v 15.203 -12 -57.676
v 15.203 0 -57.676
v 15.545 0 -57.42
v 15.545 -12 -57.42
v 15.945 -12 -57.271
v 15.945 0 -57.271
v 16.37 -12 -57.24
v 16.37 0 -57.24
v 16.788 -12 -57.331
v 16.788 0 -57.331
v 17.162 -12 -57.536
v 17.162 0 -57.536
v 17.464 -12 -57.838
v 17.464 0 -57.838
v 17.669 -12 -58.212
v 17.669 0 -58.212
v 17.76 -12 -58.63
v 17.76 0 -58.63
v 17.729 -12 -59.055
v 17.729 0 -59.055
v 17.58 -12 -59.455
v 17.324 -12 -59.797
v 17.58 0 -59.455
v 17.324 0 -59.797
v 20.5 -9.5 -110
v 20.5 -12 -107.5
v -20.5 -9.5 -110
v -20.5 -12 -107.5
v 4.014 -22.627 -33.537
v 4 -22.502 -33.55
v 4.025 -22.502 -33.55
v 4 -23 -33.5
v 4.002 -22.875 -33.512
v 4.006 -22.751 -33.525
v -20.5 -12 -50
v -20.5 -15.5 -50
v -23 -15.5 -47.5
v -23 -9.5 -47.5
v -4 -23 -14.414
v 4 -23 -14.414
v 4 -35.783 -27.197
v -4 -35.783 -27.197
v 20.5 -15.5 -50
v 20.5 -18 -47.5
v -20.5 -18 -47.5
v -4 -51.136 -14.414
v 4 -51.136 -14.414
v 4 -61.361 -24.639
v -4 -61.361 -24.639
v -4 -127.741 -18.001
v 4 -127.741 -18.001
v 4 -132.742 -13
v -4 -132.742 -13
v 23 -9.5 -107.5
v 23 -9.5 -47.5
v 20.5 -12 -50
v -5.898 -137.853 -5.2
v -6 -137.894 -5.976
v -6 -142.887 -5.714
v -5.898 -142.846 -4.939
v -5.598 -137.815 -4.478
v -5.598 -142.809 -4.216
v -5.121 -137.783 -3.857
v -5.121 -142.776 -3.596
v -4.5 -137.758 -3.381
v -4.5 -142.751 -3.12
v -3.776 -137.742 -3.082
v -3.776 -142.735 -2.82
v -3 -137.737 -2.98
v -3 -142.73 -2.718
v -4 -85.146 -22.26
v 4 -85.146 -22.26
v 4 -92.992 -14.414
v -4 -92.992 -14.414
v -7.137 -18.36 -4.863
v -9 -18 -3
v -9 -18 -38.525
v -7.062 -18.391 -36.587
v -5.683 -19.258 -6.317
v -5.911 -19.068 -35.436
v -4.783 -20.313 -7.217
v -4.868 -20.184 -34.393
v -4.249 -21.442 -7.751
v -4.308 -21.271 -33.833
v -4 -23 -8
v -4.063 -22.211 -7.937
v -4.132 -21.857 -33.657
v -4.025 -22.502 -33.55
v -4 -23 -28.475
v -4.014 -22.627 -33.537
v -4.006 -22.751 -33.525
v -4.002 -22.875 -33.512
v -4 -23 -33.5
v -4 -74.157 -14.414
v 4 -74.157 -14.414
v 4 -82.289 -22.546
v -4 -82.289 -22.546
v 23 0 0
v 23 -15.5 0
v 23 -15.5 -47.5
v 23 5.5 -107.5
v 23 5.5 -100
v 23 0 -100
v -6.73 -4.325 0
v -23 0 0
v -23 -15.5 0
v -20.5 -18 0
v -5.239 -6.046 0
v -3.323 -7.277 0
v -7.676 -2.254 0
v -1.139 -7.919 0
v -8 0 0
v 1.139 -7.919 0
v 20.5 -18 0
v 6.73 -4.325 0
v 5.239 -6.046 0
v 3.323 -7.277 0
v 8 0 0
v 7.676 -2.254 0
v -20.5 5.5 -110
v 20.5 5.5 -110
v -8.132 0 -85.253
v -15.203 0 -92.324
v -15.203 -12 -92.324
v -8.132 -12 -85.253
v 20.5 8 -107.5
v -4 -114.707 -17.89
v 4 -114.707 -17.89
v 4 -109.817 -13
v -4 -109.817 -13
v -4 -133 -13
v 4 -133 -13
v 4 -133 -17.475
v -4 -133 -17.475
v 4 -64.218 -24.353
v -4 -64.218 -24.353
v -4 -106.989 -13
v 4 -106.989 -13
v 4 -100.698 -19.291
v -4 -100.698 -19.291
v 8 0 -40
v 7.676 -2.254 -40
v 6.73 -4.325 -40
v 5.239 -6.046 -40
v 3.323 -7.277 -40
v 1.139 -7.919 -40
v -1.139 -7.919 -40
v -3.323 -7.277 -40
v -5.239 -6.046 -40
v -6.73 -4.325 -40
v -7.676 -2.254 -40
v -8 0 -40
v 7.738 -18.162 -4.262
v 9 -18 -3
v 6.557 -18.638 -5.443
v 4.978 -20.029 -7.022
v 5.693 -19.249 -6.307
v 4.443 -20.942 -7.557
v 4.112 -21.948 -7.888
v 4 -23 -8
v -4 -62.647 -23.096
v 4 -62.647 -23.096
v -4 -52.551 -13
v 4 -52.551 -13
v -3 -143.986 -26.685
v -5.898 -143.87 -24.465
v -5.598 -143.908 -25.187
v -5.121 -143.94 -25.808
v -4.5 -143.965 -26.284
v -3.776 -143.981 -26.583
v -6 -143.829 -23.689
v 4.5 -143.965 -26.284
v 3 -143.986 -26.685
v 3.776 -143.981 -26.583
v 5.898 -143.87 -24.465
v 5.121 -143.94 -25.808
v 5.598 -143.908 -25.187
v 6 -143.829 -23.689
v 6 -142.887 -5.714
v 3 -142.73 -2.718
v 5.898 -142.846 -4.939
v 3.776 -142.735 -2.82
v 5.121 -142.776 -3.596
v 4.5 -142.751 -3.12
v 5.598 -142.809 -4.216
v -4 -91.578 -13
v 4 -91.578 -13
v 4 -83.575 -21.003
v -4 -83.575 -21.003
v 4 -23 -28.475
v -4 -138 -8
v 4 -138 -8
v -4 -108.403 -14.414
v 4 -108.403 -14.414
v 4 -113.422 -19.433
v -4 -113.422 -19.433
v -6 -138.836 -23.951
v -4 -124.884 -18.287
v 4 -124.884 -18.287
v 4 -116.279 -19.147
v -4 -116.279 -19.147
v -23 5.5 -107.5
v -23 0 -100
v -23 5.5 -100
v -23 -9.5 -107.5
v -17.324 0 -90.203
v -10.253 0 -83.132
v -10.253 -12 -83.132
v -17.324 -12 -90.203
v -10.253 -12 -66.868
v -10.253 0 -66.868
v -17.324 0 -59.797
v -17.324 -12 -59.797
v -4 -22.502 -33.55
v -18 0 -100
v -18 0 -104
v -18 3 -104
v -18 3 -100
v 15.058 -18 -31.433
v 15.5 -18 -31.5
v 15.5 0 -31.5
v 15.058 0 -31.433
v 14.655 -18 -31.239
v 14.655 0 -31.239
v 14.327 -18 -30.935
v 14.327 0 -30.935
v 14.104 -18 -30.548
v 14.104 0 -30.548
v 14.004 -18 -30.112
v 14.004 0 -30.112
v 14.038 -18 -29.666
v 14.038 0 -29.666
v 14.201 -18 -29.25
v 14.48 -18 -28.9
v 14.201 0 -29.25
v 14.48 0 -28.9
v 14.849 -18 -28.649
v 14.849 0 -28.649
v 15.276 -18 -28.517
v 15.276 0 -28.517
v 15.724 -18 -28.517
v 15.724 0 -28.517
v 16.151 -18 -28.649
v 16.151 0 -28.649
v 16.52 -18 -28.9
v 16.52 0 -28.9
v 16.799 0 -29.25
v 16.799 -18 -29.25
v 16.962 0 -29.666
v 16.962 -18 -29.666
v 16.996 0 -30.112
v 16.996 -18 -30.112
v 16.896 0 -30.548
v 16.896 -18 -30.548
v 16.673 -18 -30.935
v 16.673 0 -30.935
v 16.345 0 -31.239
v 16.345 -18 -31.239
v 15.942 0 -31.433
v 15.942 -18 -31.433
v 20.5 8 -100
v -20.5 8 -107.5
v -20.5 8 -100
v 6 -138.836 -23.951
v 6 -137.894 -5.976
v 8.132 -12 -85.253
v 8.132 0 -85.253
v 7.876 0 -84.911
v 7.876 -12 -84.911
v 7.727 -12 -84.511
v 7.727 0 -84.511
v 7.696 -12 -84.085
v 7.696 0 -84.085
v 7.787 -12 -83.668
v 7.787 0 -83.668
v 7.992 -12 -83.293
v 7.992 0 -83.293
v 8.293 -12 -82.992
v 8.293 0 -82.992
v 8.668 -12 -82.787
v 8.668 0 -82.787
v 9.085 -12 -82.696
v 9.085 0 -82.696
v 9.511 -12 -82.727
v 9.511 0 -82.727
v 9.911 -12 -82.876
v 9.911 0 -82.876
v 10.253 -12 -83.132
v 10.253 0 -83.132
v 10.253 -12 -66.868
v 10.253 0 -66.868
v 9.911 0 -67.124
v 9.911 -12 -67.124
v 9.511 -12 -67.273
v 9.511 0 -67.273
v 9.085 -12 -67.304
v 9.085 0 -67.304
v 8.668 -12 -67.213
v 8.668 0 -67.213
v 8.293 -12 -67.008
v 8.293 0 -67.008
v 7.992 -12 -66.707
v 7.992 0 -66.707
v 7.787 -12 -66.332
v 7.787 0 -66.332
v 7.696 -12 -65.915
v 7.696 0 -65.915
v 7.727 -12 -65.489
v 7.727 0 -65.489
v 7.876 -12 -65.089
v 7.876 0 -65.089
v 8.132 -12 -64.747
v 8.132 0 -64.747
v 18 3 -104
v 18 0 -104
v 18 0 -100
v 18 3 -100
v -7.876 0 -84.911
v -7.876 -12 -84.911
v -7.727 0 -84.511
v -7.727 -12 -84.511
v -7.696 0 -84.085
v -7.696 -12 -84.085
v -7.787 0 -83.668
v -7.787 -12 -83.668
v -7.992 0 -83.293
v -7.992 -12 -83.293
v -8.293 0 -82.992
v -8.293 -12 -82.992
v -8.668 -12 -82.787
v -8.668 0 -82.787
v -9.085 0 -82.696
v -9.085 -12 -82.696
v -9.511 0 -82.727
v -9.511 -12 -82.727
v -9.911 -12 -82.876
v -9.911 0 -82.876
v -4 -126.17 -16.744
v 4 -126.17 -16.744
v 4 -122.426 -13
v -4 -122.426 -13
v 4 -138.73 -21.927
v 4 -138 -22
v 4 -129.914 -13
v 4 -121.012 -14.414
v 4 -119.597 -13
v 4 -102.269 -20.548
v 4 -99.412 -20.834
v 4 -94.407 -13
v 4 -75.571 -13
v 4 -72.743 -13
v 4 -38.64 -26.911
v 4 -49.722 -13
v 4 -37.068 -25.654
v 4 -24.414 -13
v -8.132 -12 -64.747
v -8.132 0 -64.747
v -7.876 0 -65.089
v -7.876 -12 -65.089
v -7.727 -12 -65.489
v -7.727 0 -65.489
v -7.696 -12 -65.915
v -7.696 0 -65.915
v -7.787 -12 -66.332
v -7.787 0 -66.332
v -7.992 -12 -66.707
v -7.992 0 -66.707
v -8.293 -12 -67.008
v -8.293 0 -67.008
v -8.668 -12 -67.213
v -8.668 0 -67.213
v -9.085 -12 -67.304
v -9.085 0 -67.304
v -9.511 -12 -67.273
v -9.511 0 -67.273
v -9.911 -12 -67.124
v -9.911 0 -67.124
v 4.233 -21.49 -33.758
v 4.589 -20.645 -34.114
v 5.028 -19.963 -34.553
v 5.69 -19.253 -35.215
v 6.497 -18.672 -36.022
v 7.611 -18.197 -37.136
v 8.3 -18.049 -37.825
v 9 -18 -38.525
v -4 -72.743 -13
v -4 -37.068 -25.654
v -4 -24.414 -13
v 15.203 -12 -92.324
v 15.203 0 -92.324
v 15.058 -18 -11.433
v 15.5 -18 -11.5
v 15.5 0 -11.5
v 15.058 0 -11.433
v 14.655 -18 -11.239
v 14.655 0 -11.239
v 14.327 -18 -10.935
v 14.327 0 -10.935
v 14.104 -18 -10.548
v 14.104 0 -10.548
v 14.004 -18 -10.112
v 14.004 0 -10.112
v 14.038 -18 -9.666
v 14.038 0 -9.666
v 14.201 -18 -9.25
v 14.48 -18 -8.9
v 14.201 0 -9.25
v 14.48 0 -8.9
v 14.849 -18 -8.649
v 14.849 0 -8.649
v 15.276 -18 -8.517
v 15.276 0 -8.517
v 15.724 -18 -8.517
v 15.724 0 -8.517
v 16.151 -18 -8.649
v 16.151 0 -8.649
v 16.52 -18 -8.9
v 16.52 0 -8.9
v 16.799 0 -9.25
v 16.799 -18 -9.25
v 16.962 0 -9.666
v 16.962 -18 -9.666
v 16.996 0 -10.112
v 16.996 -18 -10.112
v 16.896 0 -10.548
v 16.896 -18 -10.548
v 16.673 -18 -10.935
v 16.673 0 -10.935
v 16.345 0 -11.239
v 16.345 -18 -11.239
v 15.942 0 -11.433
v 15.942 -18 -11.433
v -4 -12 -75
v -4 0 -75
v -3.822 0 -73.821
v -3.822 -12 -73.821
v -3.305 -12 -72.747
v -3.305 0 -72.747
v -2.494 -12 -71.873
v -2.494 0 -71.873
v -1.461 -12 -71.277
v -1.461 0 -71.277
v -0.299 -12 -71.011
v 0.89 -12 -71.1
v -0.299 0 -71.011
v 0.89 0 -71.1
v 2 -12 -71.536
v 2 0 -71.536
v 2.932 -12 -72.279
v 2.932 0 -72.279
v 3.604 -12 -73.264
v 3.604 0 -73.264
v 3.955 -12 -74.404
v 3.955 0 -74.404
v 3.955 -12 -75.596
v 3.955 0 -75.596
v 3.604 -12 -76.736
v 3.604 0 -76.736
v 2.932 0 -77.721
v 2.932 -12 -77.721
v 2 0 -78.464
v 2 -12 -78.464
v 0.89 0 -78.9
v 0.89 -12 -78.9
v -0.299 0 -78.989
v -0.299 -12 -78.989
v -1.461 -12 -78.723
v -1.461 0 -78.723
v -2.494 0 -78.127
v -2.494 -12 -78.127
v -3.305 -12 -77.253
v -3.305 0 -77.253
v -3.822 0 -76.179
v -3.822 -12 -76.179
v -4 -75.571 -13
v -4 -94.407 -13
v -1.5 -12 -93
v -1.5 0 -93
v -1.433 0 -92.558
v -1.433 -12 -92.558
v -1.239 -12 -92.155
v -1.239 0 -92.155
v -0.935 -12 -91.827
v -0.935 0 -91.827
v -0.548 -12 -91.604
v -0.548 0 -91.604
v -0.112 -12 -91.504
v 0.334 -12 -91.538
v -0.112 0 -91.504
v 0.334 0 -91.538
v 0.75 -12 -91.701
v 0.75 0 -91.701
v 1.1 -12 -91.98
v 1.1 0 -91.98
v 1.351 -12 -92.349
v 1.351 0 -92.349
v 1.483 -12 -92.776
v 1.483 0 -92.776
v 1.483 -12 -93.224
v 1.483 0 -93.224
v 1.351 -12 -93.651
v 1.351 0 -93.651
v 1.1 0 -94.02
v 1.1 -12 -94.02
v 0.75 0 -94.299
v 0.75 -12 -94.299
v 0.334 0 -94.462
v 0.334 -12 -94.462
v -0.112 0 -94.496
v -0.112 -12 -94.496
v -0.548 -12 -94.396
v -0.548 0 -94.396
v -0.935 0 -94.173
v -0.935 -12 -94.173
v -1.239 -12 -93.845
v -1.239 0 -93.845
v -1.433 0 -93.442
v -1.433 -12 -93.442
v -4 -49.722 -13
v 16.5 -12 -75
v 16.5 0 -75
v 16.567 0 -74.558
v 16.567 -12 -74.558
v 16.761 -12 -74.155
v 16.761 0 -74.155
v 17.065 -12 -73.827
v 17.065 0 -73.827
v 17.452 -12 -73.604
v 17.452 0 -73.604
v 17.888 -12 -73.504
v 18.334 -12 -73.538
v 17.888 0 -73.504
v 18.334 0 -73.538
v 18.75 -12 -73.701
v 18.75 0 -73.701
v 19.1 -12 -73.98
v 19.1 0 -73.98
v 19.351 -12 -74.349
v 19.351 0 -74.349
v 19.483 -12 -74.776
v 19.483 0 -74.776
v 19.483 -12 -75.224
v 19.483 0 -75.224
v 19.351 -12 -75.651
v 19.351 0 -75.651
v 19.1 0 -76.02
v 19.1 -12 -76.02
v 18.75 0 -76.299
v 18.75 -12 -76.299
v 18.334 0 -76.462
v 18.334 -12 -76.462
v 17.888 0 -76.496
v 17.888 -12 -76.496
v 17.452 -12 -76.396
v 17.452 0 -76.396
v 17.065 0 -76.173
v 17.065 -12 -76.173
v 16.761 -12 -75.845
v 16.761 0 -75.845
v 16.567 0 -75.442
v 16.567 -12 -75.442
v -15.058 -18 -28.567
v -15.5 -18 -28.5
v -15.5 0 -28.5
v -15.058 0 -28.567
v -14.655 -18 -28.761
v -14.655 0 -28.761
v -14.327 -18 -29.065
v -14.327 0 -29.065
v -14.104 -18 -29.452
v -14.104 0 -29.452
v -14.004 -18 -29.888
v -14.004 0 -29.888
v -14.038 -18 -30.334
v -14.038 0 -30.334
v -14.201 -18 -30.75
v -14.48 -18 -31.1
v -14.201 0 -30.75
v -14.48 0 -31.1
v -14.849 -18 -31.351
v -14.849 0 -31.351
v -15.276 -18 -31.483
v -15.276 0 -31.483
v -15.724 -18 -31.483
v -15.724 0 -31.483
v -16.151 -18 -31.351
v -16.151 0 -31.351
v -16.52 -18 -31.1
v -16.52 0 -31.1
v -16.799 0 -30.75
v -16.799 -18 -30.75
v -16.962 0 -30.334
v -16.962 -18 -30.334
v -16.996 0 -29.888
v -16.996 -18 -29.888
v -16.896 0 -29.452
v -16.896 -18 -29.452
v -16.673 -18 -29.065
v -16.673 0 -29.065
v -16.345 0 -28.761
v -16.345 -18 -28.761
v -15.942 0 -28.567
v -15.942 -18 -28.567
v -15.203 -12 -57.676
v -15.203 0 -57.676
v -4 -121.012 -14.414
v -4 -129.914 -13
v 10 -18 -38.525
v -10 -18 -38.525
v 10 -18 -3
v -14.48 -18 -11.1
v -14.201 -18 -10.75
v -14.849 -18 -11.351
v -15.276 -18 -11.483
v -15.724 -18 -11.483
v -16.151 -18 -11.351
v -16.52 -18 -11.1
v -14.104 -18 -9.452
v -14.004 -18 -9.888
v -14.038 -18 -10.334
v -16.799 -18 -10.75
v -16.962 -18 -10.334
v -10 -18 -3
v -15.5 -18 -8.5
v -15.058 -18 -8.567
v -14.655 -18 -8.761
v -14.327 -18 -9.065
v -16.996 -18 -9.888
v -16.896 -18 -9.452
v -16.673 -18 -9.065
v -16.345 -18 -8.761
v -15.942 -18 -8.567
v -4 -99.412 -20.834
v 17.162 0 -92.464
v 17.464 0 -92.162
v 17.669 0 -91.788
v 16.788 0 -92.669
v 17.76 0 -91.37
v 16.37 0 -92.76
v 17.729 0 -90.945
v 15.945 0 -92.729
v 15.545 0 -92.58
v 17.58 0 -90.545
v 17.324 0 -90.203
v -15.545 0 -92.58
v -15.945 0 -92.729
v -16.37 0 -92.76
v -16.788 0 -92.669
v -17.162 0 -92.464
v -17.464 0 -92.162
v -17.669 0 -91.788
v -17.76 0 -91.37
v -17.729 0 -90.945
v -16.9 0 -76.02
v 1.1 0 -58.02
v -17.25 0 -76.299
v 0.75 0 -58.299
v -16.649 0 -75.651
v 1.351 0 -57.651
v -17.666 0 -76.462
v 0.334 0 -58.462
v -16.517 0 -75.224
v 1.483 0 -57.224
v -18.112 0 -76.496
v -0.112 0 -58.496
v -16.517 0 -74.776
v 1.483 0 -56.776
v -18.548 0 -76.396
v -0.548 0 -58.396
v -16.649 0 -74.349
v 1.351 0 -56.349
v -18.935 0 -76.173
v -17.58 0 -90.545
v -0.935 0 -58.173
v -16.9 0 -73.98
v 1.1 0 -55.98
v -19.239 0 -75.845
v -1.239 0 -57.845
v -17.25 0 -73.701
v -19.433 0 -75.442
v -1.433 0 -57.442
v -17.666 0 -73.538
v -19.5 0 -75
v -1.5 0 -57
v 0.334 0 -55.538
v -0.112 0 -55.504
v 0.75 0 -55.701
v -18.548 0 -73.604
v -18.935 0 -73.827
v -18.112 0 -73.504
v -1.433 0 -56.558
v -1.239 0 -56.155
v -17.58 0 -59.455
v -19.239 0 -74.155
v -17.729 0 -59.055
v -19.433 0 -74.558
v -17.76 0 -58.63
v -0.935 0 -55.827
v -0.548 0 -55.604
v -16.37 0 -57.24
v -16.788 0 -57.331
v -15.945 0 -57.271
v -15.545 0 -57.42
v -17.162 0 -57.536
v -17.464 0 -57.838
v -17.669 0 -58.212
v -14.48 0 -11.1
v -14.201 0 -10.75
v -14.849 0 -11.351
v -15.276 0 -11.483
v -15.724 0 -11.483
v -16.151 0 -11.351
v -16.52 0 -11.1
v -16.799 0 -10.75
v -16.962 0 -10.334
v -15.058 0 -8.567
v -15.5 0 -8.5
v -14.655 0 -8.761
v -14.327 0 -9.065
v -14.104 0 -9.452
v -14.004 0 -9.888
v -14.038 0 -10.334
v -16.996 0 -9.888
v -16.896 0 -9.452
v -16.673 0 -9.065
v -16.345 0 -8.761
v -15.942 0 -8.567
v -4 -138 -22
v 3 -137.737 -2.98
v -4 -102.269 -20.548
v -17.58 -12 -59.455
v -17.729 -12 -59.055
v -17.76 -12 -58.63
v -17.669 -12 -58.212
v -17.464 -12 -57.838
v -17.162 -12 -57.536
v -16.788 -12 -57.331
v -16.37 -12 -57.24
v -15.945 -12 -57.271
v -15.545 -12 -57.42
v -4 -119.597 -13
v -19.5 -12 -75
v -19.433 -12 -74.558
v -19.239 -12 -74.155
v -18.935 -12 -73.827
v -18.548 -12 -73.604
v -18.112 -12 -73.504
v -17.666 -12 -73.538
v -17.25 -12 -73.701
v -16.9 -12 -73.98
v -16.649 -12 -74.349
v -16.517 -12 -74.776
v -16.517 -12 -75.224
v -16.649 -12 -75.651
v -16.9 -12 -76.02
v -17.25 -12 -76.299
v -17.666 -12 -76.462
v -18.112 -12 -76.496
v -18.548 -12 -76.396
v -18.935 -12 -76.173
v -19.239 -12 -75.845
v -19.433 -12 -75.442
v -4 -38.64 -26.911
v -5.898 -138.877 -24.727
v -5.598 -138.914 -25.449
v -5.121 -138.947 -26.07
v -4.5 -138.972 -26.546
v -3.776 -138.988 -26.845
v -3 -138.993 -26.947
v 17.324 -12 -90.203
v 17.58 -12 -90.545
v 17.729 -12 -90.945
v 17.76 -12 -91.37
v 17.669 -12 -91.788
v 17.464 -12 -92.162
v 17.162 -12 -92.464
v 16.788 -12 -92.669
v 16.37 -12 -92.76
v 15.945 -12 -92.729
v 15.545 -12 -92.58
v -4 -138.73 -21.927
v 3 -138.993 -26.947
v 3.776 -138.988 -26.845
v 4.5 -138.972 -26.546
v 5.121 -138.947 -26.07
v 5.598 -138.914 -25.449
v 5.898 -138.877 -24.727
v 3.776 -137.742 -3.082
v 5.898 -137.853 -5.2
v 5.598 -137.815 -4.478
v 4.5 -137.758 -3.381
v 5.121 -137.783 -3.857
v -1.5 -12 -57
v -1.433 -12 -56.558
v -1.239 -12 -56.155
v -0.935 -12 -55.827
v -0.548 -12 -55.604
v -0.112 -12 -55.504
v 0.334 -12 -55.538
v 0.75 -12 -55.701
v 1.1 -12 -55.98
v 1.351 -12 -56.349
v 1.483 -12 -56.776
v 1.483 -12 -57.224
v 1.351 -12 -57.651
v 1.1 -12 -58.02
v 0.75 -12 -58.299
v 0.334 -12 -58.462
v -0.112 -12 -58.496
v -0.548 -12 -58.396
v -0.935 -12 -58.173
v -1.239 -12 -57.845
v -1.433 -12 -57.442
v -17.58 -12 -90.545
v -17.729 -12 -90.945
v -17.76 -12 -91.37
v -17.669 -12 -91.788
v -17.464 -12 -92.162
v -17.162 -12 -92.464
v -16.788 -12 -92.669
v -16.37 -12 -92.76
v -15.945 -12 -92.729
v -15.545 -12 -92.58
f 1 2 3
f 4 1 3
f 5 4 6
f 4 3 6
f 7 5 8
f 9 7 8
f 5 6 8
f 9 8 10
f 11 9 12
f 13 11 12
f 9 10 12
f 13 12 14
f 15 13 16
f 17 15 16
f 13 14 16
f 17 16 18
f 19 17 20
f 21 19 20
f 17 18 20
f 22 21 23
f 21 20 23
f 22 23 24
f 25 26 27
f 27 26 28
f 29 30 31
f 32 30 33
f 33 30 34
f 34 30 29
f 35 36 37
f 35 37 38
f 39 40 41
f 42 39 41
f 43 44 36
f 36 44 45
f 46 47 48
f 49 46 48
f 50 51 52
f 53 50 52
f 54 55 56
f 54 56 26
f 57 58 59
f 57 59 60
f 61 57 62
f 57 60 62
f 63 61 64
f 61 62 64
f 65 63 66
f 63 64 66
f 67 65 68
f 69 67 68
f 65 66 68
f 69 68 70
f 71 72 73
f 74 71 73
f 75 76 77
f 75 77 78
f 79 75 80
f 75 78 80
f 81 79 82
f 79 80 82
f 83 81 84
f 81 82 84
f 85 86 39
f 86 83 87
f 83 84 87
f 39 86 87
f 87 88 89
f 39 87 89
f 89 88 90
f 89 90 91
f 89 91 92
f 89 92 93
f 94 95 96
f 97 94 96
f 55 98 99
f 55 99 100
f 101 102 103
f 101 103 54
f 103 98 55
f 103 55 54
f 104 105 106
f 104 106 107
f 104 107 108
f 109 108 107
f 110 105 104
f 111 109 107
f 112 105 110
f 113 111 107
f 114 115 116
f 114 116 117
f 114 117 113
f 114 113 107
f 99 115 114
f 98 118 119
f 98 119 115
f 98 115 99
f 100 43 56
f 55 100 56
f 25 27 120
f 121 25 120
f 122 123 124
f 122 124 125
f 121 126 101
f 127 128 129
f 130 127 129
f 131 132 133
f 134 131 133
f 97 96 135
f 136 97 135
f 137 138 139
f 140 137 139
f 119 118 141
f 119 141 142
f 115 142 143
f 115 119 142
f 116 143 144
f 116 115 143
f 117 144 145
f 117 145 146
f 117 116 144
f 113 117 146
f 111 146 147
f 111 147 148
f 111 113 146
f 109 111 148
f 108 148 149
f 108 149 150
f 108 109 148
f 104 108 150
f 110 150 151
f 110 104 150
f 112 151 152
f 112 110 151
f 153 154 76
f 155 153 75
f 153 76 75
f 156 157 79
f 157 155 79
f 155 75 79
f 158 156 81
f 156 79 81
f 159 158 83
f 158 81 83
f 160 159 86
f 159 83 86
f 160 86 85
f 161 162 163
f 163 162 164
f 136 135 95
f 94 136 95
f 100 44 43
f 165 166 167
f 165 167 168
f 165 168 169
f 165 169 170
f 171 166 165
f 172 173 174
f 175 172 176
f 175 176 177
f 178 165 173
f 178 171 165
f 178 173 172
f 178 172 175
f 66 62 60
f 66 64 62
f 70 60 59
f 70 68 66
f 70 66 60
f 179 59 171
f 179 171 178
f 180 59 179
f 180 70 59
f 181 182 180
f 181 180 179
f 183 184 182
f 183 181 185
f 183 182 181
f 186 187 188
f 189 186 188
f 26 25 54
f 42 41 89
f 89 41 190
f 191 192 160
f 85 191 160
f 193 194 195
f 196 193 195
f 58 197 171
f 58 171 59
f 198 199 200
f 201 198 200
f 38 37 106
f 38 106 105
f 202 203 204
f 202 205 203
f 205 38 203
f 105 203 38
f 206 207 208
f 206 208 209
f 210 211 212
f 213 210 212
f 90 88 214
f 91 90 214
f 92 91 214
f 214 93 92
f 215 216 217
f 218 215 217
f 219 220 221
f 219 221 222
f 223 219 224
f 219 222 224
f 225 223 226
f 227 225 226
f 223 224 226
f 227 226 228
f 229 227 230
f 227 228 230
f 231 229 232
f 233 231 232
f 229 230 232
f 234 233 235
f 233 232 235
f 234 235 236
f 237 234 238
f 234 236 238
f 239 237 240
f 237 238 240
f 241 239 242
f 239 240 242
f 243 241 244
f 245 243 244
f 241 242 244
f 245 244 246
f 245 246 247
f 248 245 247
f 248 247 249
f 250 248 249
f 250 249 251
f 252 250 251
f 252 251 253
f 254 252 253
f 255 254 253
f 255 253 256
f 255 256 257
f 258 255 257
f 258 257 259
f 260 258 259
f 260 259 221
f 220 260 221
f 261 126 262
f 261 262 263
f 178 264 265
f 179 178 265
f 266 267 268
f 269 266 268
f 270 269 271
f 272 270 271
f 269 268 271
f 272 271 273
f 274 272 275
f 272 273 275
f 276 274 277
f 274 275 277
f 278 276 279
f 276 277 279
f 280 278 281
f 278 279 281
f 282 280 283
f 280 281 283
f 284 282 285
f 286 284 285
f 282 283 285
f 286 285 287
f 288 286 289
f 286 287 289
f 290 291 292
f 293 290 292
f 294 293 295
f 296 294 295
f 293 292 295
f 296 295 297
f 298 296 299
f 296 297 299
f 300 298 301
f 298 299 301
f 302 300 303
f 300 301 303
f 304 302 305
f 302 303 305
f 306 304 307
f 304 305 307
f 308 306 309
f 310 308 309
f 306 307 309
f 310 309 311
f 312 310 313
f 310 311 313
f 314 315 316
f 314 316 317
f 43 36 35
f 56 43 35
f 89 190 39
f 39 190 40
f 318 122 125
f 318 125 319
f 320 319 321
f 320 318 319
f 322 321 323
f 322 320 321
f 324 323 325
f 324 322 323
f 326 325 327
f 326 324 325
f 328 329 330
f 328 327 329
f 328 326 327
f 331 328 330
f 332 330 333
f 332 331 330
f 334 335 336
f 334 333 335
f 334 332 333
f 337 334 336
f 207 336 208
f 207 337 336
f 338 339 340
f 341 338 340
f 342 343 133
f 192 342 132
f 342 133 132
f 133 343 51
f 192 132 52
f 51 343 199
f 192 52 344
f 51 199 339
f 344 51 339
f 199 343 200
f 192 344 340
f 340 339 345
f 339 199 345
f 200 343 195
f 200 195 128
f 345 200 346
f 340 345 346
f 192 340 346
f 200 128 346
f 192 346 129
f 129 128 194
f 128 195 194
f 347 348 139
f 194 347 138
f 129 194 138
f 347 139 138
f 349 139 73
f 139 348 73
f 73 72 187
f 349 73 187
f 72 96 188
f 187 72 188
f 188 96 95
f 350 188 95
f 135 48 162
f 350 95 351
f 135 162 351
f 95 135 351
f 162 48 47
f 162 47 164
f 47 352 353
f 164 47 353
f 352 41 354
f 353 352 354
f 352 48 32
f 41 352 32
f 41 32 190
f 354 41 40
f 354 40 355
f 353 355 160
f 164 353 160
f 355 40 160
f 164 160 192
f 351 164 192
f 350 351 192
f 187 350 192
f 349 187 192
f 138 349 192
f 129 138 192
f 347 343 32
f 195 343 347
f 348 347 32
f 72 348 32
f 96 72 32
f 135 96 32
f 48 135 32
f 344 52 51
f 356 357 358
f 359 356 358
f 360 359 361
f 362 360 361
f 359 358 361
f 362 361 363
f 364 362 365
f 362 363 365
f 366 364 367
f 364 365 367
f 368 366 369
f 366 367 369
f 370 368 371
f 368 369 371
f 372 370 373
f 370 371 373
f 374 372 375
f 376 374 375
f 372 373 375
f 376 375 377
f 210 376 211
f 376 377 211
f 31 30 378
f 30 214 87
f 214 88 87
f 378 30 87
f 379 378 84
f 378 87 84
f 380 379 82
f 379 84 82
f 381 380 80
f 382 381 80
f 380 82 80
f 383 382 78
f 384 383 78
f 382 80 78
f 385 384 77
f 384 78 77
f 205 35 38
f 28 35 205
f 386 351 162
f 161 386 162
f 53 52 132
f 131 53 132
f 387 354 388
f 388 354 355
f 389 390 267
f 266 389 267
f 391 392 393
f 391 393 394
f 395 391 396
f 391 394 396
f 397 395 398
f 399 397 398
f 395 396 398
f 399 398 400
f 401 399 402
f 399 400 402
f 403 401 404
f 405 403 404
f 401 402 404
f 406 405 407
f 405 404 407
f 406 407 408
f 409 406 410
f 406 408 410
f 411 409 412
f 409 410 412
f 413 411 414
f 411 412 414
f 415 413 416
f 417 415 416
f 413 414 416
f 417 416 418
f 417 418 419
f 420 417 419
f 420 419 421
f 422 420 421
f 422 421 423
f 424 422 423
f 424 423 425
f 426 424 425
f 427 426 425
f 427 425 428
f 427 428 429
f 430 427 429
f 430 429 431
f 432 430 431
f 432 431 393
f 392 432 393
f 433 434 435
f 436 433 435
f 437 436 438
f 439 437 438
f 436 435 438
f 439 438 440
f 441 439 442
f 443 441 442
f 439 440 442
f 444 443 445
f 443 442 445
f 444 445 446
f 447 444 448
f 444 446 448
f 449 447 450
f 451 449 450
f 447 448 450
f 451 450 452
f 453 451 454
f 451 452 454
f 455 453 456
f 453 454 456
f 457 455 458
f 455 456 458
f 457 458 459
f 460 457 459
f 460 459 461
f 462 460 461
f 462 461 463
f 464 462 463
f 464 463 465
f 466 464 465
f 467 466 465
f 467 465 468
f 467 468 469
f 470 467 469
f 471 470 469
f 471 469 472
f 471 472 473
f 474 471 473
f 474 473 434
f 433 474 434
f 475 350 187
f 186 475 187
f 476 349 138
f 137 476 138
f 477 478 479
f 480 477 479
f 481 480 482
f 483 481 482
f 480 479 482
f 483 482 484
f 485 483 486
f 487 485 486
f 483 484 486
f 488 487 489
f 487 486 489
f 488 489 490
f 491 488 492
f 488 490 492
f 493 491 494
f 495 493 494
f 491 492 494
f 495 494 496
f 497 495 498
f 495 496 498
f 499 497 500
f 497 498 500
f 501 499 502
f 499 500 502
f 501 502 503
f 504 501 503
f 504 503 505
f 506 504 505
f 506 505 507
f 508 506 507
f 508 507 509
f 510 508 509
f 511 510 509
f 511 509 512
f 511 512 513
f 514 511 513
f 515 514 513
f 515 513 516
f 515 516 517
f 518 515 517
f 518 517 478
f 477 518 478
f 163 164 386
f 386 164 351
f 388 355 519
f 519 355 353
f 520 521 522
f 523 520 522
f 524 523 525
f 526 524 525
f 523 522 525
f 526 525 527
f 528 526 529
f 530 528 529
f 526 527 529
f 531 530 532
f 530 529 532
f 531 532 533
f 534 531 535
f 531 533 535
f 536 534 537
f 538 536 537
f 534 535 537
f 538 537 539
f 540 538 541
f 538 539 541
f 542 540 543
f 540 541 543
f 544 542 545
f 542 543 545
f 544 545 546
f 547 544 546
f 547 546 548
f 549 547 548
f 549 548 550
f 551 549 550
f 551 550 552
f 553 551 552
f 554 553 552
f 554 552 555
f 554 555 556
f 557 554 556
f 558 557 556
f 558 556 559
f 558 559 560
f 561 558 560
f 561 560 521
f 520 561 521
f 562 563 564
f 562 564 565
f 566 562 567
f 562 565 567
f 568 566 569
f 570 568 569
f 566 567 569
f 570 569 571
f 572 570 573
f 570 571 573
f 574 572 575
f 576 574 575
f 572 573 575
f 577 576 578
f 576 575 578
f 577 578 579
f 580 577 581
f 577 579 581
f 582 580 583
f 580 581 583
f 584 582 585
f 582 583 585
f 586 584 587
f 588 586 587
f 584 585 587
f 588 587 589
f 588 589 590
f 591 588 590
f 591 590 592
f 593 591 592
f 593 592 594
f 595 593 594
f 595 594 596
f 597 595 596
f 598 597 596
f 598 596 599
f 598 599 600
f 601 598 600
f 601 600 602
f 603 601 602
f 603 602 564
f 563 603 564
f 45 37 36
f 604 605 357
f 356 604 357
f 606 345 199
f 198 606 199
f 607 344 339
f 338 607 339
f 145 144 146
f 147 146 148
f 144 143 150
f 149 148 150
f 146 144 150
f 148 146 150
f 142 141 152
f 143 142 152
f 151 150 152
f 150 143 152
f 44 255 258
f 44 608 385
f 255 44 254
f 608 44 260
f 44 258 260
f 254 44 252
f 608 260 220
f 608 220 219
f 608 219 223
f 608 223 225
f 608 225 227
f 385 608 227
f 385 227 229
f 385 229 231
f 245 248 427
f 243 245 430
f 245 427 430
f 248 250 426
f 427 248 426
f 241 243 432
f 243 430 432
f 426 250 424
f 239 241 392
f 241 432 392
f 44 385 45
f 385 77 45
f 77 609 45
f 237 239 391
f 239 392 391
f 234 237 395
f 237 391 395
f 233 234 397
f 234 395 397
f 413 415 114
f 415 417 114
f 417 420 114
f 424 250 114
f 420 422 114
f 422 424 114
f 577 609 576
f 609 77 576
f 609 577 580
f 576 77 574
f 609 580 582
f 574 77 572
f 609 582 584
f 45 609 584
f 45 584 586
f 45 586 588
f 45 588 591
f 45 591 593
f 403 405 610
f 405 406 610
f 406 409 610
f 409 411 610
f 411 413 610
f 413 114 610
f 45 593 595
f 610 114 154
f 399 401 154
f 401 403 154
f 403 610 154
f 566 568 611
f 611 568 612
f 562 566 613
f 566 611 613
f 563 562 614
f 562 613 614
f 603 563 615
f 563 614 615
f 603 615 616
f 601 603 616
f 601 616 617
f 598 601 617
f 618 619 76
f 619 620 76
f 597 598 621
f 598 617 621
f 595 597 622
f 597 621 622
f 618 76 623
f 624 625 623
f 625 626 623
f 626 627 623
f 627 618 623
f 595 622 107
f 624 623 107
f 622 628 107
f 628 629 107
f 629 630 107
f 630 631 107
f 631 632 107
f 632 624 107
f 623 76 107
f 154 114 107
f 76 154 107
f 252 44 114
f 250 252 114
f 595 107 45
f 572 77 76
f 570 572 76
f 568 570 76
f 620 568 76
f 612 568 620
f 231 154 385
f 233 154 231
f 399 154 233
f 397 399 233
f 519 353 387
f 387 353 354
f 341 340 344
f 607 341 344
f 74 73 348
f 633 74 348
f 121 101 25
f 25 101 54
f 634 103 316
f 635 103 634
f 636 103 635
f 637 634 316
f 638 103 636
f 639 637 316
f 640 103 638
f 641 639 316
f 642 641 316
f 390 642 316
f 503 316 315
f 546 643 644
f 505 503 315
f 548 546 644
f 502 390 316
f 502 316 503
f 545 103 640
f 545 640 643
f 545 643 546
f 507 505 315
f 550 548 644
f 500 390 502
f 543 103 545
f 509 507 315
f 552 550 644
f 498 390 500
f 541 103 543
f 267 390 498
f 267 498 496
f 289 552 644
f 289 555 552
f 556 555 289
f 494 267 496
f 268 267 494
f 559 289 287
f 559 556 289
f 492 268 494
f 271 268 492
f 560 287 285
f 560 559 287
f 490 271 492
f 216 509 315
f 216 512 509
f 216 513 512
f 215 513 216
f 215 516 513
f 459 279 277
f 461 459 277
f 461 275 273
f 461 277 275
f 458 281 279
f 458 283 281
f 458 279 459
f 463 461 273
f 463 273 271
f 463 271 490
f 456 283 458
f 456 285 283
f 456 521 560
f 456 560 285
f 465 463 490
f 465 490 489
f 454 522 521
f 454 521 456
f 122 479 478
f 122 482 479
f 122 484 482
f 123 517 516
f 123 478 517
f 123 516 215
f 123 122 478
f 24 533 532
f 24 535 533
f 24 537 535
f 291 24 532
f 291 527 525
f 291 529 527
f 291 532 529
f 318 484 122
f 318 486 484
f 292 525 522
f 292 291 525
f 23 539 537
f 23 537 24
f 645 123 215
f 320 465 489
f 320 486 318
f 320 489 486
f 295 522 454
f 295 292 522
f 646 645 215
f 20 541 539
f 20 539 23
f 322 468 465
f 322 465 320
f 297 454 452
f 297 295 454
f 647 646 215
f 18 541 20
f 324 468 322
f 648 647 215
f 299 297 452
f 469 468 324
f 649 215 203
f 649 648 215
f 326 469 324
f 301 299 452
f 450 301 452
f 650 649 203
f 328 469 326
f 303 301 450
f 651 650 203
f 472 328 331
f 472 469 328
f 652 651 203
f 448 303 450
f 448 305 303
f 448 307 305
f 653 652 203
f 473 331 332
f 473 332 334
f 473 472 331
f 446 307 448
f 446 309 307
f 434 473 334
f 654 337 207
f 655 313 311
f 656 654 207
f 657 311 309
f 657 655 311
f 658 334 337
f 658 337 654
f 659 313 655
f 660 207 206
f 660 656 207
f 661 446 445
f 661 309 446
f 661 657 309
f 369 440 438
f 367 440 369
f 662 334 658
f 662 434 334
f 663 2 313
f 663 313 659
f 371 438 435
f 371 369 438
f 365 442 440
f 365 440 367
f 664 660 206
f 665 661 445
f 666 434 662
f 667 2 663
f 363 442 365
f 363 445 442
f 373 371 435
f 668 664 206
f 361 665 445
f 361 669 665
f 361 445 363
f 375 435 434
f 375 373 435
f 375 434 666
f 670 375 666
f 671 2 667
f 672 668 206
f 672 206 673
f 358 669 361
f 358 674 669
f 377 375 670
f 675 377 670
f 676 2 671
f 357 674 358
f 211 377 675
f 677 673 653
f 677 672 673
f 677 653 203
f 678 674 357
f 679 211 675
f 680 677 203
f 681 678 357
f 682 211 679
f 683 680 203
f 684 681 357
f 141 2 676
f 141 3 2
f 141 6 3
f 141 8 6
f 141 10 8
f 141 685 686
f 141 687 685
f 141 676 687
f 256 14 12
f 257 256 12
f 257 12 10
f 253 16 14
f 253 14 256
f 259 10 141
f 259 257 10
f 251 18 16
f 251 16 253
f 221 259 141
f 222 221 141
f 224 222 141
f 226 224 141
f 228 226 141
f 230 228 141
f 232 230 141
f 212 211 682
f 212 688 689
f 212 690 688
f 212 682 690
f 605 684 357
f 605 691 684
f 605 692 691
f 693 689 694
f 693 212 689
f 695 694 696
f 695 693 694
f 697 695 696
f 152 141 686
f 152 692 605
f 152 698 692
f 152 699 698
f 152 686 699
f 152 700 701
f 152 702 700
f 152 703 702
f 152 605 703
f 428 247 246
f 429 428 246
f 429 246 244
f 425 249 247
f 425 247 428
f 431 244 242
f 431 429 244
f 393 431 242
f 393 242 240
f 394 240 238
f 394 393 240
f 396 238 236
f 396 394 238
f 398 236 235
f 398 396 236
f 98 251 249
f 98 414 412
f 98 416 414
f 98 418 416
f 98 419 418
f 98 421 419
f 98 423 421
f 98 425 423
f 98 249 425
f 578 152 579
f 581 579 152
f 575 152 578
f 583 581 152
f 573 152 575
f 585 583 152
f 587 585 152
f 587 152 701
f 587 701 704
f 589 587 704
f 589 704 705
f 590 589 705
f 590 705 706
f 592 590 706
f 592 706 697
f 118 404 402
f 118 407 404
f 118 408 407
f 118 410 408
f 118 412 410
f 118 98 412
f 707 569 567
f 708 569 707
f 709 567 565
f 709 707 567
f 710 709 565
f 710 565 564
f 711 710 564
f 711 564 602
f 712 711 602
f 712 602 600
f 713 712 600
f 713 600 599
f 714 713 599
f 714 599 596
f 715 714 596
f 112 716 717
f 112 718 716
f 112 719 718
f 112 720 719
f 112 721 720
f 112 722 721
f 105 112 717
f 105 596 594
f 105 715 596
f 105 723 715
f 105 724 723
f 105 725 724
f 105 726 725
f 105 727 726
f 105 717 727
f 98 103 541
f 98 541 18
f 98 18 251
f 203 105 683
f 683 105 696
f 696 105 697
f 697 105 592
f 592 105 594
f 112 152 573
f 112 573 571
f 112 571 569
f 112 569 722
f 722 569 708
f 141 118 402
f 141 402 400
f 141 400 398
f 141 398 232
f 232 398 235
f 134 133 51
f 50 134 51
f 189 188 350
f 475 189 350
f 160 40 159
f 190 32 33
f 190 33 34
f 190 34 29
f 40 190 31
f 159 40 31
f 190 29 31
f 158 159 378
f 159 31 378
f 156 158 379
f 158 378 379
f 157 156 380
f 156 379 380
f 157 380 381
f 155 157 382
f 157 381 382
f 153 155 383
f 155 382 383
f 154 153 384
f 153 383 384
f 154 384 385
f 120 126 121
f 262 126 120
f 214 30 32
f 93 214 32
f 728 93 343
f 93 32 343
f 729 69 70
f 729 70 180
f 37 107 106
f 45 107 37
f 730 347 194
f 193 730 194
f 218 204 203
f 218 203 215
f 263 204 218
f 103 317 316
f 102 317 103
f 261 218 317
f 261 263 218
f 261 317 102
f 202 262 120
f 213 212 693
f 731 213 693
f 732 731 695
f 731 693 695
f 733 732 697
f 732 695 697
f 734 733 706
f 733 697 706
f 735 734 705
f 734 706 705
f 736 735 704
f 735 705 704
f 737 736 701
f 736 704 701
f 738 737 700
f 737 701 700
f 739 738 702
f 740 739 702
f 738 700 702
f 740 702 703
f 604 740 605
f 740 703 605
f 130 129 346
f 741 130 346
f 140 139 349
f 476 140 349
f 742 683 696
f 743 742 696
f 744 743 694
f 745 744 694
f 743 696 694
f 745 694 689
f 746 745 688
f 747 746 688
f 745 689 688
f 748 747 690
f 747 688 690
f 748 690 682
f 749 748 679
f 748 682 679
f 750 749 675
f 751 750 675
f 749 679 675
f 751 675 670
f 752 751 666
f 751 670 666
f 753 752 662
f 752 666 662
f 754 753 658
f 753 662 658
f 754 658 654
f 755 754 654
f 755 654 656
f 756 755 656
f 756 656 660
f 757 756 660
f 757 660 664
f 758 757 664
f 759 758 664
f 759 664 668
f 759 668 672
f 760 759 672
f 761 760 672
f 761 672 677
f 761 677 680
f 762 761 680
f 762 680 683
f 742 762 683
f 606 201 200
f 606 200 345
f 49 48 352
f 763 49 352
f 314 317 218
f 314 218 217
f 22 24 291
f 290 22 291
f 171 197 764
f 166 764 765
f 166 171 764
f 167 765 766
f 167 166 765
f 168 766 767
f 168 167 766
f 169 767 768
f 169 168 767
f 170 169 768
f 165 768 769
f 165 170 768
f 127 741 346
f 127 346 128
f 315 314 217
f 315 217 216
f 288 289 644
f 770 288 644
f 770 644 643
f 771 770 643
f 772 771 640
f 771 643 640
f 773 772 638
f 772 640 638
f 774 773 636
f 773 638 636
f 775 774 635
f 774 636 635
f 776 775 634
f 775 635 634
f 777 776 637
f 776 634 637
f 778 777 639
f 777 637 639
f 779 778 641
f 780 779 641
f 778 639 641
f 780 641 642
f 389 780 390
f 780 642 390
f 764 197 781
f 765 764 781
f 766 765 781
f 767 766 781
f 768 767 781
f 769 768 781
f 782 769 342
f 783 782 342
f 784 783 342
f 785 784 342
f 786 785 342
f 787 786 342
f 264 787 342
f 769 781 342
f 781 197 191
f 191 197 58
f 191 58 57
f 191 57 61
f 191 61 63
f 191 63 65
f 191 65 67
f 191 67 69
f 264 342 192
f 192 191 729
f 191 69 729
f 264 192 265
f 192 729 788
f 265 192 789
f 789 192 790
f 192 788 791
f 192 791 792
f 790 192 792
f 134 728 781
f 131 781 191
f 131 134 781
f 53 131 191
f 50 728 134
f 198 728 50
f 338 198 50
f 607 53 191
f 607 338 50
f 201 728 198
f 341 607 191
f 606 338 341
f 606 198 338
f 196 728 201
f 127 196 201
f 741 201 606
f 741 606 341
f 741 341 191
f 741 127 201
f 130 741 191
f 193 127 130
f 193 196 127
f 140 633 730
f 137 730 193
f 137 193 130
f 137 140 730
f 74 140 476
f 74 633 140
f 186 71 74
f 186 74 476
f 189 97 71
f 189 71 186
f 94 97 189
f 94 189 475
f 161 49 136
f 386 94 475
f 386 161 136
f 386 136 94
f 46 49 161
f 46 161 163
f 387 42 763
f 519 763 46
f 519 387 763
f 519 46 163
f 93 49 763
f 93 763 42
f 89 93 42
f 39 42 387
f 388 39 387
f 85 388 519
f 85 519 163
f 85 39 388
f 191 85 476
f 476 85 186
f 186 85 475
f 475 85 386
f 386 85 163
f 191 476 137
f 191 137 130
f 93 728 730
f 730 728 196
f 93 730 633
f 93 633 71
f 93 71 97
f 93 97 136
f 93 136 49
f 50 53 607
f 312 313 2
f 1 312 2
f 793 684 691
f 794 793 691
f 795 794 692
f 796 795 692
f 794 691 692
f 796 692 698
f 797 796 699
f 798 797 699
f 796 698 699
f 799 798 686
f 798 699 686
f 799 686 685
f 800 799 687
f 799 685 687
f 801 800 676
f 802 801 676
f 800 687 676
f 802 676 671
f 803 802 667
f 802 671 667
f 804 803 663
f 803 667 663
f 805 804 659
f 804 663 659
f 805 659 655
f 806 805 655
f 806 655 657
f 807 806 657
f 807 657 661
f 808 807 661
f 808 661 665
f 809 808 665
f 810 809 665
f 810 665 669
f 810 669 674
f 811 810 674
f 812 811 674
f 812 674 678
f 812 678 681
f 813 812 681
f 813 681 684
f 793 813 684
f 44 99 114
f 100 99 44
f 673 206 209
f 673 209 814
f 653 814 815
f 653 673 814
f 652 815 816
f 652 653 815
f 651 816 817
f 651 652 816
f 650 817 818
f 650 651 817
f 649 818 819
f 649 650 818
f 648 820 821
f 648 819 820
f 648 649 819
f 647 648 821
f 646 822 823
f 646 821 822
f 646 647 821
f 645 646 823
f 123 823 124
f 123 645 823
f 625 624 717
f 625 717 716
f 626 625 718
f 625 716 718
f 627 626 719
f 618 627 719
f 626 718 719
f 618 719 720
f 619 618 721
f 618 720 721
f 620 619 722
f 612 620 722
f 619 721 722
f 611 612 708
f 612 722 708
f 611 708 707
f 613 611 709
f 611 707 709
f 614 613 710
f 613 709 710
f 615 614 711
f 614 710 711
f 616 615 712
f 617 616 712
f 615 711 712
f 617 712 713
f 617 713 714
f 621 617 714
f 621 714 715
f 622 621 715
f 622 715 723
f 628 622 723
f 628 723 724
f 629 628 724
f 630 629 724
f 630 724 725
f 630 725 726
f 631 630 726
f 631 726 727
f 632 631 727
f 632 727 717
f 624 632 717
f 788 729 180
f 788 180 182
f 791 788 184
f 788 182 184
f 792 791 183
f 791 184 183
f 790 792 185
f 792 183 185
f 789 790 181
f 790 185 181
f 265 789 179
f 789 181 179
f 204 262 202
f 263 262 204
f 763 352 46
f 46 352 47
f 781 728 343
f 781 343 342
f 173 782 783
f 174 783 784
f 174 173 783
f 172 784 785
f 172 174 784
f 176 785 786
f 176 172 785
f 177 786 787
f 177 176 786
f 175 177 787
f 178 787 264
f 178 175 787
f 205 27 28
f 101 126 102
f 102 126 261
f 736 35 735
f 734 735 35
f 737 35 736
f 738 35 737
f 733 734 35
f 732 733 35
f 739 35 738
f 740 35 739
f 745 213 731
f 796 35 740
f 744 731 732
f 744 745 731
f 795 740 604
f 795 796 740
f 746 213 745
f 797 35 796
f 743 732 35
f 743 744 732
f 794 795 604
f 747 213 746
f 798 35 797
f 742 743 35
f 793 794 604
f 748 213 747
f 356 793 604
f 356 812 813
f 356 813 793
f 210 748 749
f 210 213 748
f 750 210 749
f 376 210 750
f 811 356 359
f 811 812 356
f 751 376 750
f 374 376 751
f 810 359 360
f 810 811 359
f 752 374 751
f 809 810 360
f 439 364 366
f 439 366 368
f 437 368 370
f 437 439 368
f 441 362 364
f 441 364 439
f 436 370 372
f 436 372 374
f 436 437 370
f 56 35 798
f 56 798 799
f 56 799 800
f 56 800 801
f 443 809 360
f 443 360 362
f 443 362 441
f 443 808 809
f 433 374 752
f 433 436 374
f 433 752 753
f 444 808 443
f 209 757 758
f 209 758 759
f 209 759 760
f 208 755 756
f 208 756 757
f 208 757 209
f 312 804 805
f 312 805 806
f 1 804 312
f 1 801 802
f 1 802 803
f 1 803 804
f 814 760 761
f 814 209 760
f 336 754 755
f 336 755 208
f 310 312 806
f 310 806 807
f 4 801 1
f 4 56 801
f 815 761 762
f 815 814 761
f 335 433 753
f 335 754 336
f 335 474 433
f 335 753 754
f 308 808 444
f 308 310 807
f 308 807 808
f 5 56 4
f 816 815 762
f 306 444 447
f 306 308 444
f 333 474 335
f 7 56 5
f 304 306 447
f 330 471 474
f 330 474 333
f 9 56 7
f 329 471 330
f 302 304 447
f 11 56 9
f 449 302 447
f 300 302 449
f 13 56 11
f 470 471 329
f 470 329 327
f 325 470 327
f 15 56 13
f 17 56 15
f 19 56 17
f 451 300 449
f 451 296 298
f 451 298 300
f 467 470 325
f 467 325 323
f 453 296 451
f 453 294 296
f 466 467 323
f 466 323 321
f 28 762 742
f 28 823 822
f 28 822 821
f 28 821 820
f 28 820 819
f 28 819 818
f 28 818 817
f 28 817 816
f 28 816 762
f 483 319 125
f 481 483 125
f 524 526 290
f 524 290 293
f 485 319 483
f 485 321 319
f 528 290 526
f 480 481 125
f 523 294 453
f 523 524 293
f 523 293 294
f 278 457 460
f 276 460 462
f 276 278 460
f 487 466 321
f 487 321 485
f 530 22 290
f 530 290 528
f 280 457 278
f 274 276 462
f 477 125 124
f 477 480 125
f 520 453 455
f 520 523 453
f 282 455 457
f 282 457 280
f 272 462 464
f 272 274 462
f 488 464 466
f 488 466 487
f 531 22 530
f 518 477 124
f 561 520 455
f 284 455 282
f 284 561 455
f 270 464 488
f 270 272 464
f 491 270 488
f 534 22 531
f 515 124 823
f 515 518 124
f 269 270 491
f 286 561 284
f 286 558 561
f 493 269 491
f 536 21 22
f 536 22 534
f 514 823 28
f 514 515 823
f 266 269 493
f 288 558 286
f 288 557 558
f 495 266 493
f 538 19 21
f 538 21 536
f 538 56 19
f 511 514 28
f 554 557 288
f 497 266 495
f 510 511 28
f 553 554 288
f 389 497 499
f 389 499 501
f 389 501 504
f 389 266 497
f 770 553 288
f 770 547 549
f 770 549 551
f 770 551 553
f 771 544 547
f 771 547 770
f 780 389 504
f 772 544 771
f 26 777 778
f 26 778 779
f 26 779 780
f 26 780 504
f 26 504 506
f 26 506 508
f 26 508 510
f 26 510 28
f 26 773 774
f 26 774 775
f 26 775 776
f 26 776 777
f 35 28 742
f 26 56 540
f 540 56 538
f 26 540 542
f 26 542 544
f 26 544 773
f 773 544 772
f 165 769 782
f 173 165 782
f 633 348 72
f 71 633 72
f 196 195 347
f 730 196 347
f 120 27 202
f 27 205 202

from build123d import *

# Parameters (mm, degrees)
Y_KSEKLIK_EKSTR_ZYON1_DEPTH = 40
IZIM2_W                     = 46
IZIM2_H                     = 18
Y_KSEKLIK_EKSTR_ZYON2_DEPTH = 70
IZIM3_W                     = 60
IZIM3_H                     = 6
KES_EKSTR_ZYON1_DEPTH       = 60
IZIM4_R                     = 4
IZIM4_R_2                   = 1.5
KES_EKSTR_ZYON2_DEPTH       = 60
Y_KSEKLIK_EKSTR_ZYON3_DEPTH = 46
PAH4_SIZE                   = 2.5
IZIM7_W                     = 5
IZIM7_H                     = 3
Y_KSEKLIK_EKSTR_ZYON4_DEPTH = 4
Y_KSEKLIK_EKSTR_ZYON5_DEPTH = 4
KES_EKSTR_ZYON4_DEPTH       = 10
RADYUS2_START               = -4
RADYUS2_DEPTH               = 8
RADYUS2_START_2             = -38.524937811
RADYUS2_2_DEPTH             = 35.524937811
RADYUS2_START_3             = -10
RADYUS2_3_DEPTH             = 20
Y_KSEKLIK_EKSTR_ZYON6_DEPTH = 8
IZIM12_W                    = 12
IZIM12_H                    = 24
Y_KSEKLIK_EKSTR_ZYON7_DEPTH = 5
RADYUS3_R                   = 3
IZIM13_R                    = 1.5
KES_EKSTR_ZYON5_DEPTH       = 35


with BuildPart() as part:
    # Çizim1 → Yükseklik-Ekstrüzyon1 (new body)
    with BuildSketch(Plane.XY):
        with BuildLine():
            Line((-8, 0), (-23, 0))
            Line((-23, 0), (-23, -18))
            Line((-23, -18), (23, -18))
            Line((23, -18), (23, 0))
            Line((23, 0), (8, 0))
            ThreePointArc((8, 0), (0, -8), (-8, 0))
        make_face()
    extrude(amount=-Y_KSEKLIK_EKSTR_ZYON1_DEPTH)

    # Çizim2 → Yükseklik-Ekstrüzyon2 (add)
    with BuildSketch(Plane(origin=(0, 0, -40), x_dir=(-1, 0, 0), z_dir=(0, 0, -1))):
        with Locations((0, -9)):
            Rectangle(IZIM2_W, IZIM2_H)
    extrude(amount=Y_KSEKLIK_EKSTR_ZYON2_DEPTH)

    # Çizim3 → Kes-Ekstrüzyon1 (cut)
    with BuildSketch(Plane(origin=(23, 0, 0), x_dir=(0, 0, -1), z_dir=(1, 0, 0))):
        with Locations((80, -15)):
            Rectangle(IZIM3_W, IZIM3_H)
    extrude(amount=-KES_EKSTR_ZYON1_DEPTH, mode=Mode.SUBTRACT)

    # Çizim4 → Kes-Ekstrüzyon2 (cut)
    with BuildSketch(Plane(origin=(0, 0, 0), x_dir=(1, 0, 0), z_dir=(0, 1, 0))):
        with Locations(Location((0, 75, 0), (0, 0, 180))):
            Circle(IZIM4_R)
        with Locations(Location((0, 57, 0), (0, 0, 180))):
            Circle(IZIM4_R_2)
        with Locations(Location((-18, 75, 0), (0, 0, 180))):
            Circle(IZIM4_R_2)
        with Locations(Location((0, 93, 0), (0, 0, 180))):
            Circle(IZIM4_R_2)
        with Locations(Location((18, 75, 0), (0, 0, 180))):
            Circle(IZIM4_R_2)
        with BuildLine():
            Line((-15.202795796, 92.324116139), (-8.131727984, 85.253048327))
            ThreePointArc((-8.131727984, 85.253048327), (-8.131727984, 83.131727984), (-10.253048327, 83.131727984))
            Line((-10.253048327, 83.131727984), (-17.324116139, 90.202795796))
            ThreePointArc((-17.324116139, 90.202795796), (-17.324116139, 92.324116139), (-15.202795796, 92.324116139))
        make_face()
        with BuildLine():
            Line((15.202795796, 92.324116139), (8.131727984, 85.253048327))
            ThreePointArc((8.131727984, 85.253048327), (8.131727984, 83.131727984), (10.253048327, 83.131727984))
            Line((10.253048327, 83.131727984), (17.324116139, 90.202795796))
            ThreePointArc((17.324116139, 90.202795796), (17.324116139, 92.324116139), (15.202795796, 92.324116139))
        make_face()
        with BuildLine():
            Line((17.324116139, 59.797204204), (10.253048327, 66.868272016))
            ThreePointArc((10.253048327, 66.868272016), (8.131727984, 66.868272016), (8.131727984, 64.746951673))
            Line((8.131727984, 64.746951673), (15.202795796, 57.675883861))
            ThreePointArc((15.202795796, 57.675883861), (17.324116139, 57.675883861), (17.324116139, 59.797204204))
        make_face()
        with BuildLine():
            Line((-15.202795796, 57.675883861), (-8.131727984, 64.746951673))
            ThreePointArc((-8.131727984, 64.746951673), (-8.131727984, 66.868272016), (-10.253048327, 66.868272016))
            Line((-10.253048327, 66.868272016), (-17.324116139, 59.797204204))
            ThreePointArc((-17.324116139, 59.797204204), (-17.324116139, 57.675883861), (-15.202795796, 57.675883861))
        make_face()
    extrude(amount=-KES_EKSTR_ZYON2_DEPTH, mode=Mode.SUBTRACT)

    # Çizim5 → Yükseklik-Ekstrüzyon3 (add)
    with BuildSketch(Plane(origin=(23, 0, 0), x_dir=(0, 0, -1), z_dir=(1, 0, 0))):
        Polygon((110, 0), (110, 8), (100, 8), (100, 3), (104, 3), (104, 0), align=None)
    extrude(amount=-Y_KSEKLIK_EKSTR_ZYON3_DEPTH)

    # Pah4
    pah4_edges = [part.edges().sort_by_distance(p)[0] for p in [
        (23, 8, -105),
        (0, 8, -110),
        (-23, 8, -105),
        (23, -2, -110),
        (-23, -2, -110),
        (0, -12, -110),
        (-23, -18, -25),
        (-23, -15, -50),
        (23, -18, -25),
        (-23, -12, -80),
        (0, -18, -50),
        (23, -15, -50),
        (23, -12, -80),
    ]]
    chamfer(pah4_edges, length=PAH4_SIZE)

    # Çizim7 → Yükseklik-Ekstrüzyon4 (add)
    with BuildSketch(Plane.XY.offset(-104)):
        with Locations((-20.5, 1.5)):
            Rectangle(IZIM7_W, IZIM7_H)
        with Locations((20.5, 1.5)):
            Rectangle(IZIM7_W, IZIM7_H)
    extrude(amount=Y_KSEKLIK_EKSTR_ZYON4_DEPTH)

    # Çizim9 → Yükseklik-Ekstrüzyon5 (add, symmetric)
    with BuildSketch(Plane(origin=(0, 0, 0), x_dir=(0, 0, -1), z_dir=(1, 0, 0))):
        Polygon((8, -18), (34, -18), (22, -138), (8, -138), align=None)
    extrude(amount=Y_KSEKLIK_EKSTR_ZYON5_DEPTH, both=True)

    # Çizim10 → Kes-Ekstrüzyon4 (cut)
    with BuildSketch(Plane(origin=(4, 0, 0), x_dir=(0, 0, -1), z_dir=(1, 0, 0))):
        Polygon((13, -132.742033617), (13, -133), (17.475062189, -133), (18.000954253, -127.741079364), (13.707106781, -132.034926836), align=None)
        Polygon((13, -122.42585543), (13, -129.913606492), (16.743875531, -126.169730961), align=None)
        Polygon((14.414213562, -121.011641868), (18.286653963, -124.884082268), (19.147196274, -116.278659157), align=None)
        Polygon((13, -109.817193202), (13, -119.597428306), (17.890117552, -114.707310754), align=None)
        Polygon((14.414213562, -108.40297964), (19.432895983, -113.421662061), (20.548158744, -102.269034459), align=None)
        Polygon((13, -94.406606035), (13, -106.988766077), (19.291080021, -100.697686056), align=None)
        Polygon((14.414213562, -92.992392472), (20.833858453, -99.412037363), (22.260446207, -85.146159828), align=None)
        Polygon((13, -75.571443941), (13, -91.57817891), (21.003367485, -83.574811425), align=None)
        Polygon((14.414213562, -74.157230378), (22.546145916, -82.289162732), (24.353241995, -64.218201946), align=None)
        Polygon((13, -52.55069027), (13, -72.743016816), (23.096163273, -62.646853543), align=None)
        Polygon((14.414213562, -51.136476708), (24.638941704, -61.36120485), (26.911103514, -38.639586757), align=None)
        Polygon((13, -24.414213562), (13, -49.722263146), (25.654024792, -37.068238354), align=None)
        Polygon((14.414213562, -23), (27.196803223, -35.782589661), (28.475062189, -23), align=None)
    extrude(amount=-KES_EKSTR_ZYON4_DEPTH, mode=Mode.SUBTRACT)

    # Radyus2: read off the stored shape, not the designer's step
    # Radyus2 outline → Radyus2 (add)
    with BuildSketch(Plane.YZ.offset(RADYUS2_START)):
        with BuildLine():
            Line((-18, -38.524937811), (-18, -34))
            Line((-18, -34), (-22.502481405, -33.54975186))
            ThreePointArc((-22.502481405, -33.54975186), (-19.292737332, -35.169911207), (-18, -38.524937811))
        make_face()
        with BuildLine():
            ThreePointArc((-18, -3), (-19.464466094, -6.535533906), (-23, -8))
            Line((-23, -8), (-18, -8))
            Line((-18, -8), (-18, -3))
        make_face()
    extrude(amount=RADYUS2_DEPTH)

    # Radyus2 2 outline → Radyus2 2 (add)
    with BuildSketch(Plane.XY.offset(RADYUS2_START_2)):
        with BuildLine():
            Line((4, -18), (4, -23))
            ThreePointArc((4, -23), (5.464466094, -19.464466094), (9, -18))
            Line((9, -18), (4, -18))
        make_face()
        with BuildLine():
            Line((-4, -23), (-4, -18))
            Line((-4, -18), (-9, -18))
            ThreePointArc((-9, -18), (-5.464466094, -19.464466094), (-4, -23))
        make_face()
    extrude(amount=RADYUS2_2_DEPTH)

    # Radyus2 3 outline → Radyus2 3 (cut)
    with BuildSketch(Plane.YZ.offset(RADYUS2_START_3)):
        with BuildLine():
            Line((-22.502481405, -33.54975186), (-23, -33.5))
            Line((-23, -33.5), (-23, -38.524937811))
            Line((-23, -38.524937811), (-18, -38.524937811))
            ThreePointArc((-18, -38.524937811), (-19.292737332, -35.169911207), (-22.502481405, -33.54975186))
        make_face()
        with BuildLine():
            Line((-23, -3), (-23, -8))
            ThreePointArc((-23, -8), (-19.464466094, -6.535533906), (-18, -3))
            Line((-18, -3), (-23, -3))
        make_face()
    extrude(amount=RADYUS2_3_DEPTH, mode=Mode.SUBTRACT)

    # Çizim11 → Yükseklik-Ekstrüzyon6 (add)
    with BuildSketch(Plane.ZY.offset(4)):
        Polygon((-22, -138), (-21.927011625, -138.729883751), (-8, -138), align=None)
    extrude(amount=-Y_KSEKLIK_EKSTR_ZYON6_DEPTH)

    # Çizim12 → Yükseklik-Ekstrüzyon7 (add)
    with BuildSketch(Plane(origin=(0, -137.203896927, 7.190551547), x_dir=(1, 0, 0), z_dir=(0, -0.9986295347545744, 0.05233595624293665))):
        with Locations((0, -22.184460391)):
            Rectangle(IZIM12_W, IZIM12_H)
    extrude(amount=Y_KSEKLIK_EKSTR_ZYON7_DEPTH)

    # Radyus3
    radyus3_edges = [part.edges().sort_by_distance(p)[0] for p in [
        (6, -141.489547187, -26.816220339),
        (6, -140.233484238, -2.849111505),
        (-6, -140.233484238, -2.849111505),
        (-6, -141.489547187, -26.816220339),
    ]]
    fillet(radyus3_edges, radius=RADYUS3_R)

    # Çizim13 → Kes-Ekstrüzyon5 (cut)
    with BuildSketch(Plane(origin=(0, 0, 0), x_dir=(1, 0, 0), z_dir=(0, 1, 0))):
        with Locations(Location((-15.5, 10, 0), (0, 0, 270))):
            Circle(IZIM13_R)
        with Locations(Location((-15.5, 30, 0), (0, 0, 270))):
            Circle(IZIM13_R)
        with Locations(Location((15.5, 30, 0), (0, 0, 90))):
            Circle(IZIM13_R)
        with Locations(Location((15.5, 10, 0), (0, 0, 90))):
            Circle(IZIM13_R)
    extrude(amount=-KES_EKSTR_ZYON5_DEPTH, mode=Mode.SUBTRACT)


solid = part.part
